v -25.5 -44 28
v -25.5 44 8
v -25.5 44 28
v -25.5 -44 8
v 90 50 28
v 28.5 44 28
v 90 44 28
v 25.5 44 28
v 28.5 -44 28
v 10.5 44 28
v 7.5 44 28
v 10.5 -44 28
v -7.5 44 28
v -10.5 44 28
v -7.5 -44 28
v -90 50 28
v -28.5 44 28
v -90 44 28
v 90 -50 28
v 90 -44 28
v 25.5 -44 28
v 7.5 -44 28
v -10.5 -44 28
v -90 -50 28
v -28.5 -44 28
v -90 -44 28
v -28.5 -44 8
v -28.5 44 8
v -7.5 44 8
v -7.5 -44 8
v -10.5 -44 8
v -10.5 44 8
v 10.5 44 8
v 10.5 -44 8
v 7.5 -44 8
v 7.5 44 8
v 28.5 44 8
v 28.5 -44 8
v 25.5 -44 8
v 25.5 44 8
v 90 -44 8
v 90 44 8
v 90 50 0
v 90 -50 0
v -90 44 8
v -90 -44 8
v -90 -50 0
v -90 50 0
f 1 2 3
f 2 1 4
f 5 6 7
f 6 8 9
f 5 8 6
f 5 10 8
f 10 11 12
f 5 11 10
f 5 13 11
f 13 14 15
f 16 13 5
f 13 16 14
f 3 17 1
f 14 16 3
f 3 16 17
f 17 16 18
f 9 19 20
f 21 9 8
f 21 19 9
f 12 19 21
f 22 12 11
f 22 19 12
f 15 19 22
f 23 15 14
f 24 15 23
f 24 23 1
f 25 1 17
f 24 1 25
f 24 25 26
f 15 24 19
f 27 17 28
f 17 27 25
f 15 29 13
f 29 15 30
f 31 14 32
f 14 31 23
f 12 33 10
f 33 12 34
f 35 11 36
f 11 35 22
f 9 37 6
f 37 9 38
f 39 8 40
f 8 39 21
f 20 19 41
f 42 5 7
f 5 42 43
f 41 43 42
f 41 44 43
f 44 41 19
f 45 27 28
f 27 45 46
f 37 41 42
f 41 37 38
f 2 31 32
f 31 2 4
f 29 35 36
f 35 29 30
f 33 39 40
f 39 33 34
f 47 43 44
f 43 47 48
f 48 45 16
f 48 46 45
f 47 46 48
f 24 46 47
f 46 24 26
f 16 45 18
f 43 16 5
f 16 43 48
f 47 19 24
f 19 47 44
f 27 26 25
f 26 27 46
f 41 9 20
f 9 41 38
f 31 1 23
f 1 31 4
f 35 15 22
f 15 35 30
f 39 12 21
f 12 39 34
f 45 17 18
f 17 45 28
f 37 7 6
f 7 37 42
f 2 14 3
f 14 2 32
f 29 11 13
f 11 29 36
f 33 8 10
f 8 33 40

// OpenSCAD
$fn = 32;

// ----------------------------------------------------------------------
// Rib frame 180 x 100 x 28
// 4 ribs at 18 mm pitch
// ----------------------------------------------------------------------

// --- parameters (mm) ---
frame = [180, 100, 8];  // base plate size (x, y, z)
rail_w = 6;             // side rail width
ribs = 4;               // number of ribs
rib_t = 3;              // rib thickness
rib_h = 20;             // rib height above the base plate
pitch = 18;             // pitch between rib centres

// --- derived feature positions (mm) ---
span = (ribs - 1) * pitch;          // = 54   distance between the outer ribs
origin_x = -span / 2;               // = -27   X of the first rib
rib_len = frame[1] - 2 * rail_w + 2;  // = 90   rib length, 1 mm into each rail
feature_centers = [
  [origin_x + 0 * pitch, 0],
  [origin_x + 1 * pitch, 0],
  [origin_x + 2 * pitch, 0],
  [origin_x + 3 * pitch, 0]
];   // rib centre line, drives the rib loop

// base plate, two side rails, then the ribs read straight off feature_centers
union() {
  translate([-frame[0] / 2, -frame[1] / 2, 0]) cube(frame);
  translate([-frame[0] / 2, -frame[1] / 2, 0]) cube([frame[0], rail_w, frame[2] + rib_h]);
  translate([-frame[0] / 2, frame[1] / 2 - rail_w, 0]) cube([frame[0], rail_w, frame[2] + rib_h]);
  for (centre = feature_centers)
    translate([centre[0] - rib_t / 2, centre[1] - rib_len / 2, frame[2] - 1])
      cube([rib_t, rib_len, rib_h + 1]);
}
